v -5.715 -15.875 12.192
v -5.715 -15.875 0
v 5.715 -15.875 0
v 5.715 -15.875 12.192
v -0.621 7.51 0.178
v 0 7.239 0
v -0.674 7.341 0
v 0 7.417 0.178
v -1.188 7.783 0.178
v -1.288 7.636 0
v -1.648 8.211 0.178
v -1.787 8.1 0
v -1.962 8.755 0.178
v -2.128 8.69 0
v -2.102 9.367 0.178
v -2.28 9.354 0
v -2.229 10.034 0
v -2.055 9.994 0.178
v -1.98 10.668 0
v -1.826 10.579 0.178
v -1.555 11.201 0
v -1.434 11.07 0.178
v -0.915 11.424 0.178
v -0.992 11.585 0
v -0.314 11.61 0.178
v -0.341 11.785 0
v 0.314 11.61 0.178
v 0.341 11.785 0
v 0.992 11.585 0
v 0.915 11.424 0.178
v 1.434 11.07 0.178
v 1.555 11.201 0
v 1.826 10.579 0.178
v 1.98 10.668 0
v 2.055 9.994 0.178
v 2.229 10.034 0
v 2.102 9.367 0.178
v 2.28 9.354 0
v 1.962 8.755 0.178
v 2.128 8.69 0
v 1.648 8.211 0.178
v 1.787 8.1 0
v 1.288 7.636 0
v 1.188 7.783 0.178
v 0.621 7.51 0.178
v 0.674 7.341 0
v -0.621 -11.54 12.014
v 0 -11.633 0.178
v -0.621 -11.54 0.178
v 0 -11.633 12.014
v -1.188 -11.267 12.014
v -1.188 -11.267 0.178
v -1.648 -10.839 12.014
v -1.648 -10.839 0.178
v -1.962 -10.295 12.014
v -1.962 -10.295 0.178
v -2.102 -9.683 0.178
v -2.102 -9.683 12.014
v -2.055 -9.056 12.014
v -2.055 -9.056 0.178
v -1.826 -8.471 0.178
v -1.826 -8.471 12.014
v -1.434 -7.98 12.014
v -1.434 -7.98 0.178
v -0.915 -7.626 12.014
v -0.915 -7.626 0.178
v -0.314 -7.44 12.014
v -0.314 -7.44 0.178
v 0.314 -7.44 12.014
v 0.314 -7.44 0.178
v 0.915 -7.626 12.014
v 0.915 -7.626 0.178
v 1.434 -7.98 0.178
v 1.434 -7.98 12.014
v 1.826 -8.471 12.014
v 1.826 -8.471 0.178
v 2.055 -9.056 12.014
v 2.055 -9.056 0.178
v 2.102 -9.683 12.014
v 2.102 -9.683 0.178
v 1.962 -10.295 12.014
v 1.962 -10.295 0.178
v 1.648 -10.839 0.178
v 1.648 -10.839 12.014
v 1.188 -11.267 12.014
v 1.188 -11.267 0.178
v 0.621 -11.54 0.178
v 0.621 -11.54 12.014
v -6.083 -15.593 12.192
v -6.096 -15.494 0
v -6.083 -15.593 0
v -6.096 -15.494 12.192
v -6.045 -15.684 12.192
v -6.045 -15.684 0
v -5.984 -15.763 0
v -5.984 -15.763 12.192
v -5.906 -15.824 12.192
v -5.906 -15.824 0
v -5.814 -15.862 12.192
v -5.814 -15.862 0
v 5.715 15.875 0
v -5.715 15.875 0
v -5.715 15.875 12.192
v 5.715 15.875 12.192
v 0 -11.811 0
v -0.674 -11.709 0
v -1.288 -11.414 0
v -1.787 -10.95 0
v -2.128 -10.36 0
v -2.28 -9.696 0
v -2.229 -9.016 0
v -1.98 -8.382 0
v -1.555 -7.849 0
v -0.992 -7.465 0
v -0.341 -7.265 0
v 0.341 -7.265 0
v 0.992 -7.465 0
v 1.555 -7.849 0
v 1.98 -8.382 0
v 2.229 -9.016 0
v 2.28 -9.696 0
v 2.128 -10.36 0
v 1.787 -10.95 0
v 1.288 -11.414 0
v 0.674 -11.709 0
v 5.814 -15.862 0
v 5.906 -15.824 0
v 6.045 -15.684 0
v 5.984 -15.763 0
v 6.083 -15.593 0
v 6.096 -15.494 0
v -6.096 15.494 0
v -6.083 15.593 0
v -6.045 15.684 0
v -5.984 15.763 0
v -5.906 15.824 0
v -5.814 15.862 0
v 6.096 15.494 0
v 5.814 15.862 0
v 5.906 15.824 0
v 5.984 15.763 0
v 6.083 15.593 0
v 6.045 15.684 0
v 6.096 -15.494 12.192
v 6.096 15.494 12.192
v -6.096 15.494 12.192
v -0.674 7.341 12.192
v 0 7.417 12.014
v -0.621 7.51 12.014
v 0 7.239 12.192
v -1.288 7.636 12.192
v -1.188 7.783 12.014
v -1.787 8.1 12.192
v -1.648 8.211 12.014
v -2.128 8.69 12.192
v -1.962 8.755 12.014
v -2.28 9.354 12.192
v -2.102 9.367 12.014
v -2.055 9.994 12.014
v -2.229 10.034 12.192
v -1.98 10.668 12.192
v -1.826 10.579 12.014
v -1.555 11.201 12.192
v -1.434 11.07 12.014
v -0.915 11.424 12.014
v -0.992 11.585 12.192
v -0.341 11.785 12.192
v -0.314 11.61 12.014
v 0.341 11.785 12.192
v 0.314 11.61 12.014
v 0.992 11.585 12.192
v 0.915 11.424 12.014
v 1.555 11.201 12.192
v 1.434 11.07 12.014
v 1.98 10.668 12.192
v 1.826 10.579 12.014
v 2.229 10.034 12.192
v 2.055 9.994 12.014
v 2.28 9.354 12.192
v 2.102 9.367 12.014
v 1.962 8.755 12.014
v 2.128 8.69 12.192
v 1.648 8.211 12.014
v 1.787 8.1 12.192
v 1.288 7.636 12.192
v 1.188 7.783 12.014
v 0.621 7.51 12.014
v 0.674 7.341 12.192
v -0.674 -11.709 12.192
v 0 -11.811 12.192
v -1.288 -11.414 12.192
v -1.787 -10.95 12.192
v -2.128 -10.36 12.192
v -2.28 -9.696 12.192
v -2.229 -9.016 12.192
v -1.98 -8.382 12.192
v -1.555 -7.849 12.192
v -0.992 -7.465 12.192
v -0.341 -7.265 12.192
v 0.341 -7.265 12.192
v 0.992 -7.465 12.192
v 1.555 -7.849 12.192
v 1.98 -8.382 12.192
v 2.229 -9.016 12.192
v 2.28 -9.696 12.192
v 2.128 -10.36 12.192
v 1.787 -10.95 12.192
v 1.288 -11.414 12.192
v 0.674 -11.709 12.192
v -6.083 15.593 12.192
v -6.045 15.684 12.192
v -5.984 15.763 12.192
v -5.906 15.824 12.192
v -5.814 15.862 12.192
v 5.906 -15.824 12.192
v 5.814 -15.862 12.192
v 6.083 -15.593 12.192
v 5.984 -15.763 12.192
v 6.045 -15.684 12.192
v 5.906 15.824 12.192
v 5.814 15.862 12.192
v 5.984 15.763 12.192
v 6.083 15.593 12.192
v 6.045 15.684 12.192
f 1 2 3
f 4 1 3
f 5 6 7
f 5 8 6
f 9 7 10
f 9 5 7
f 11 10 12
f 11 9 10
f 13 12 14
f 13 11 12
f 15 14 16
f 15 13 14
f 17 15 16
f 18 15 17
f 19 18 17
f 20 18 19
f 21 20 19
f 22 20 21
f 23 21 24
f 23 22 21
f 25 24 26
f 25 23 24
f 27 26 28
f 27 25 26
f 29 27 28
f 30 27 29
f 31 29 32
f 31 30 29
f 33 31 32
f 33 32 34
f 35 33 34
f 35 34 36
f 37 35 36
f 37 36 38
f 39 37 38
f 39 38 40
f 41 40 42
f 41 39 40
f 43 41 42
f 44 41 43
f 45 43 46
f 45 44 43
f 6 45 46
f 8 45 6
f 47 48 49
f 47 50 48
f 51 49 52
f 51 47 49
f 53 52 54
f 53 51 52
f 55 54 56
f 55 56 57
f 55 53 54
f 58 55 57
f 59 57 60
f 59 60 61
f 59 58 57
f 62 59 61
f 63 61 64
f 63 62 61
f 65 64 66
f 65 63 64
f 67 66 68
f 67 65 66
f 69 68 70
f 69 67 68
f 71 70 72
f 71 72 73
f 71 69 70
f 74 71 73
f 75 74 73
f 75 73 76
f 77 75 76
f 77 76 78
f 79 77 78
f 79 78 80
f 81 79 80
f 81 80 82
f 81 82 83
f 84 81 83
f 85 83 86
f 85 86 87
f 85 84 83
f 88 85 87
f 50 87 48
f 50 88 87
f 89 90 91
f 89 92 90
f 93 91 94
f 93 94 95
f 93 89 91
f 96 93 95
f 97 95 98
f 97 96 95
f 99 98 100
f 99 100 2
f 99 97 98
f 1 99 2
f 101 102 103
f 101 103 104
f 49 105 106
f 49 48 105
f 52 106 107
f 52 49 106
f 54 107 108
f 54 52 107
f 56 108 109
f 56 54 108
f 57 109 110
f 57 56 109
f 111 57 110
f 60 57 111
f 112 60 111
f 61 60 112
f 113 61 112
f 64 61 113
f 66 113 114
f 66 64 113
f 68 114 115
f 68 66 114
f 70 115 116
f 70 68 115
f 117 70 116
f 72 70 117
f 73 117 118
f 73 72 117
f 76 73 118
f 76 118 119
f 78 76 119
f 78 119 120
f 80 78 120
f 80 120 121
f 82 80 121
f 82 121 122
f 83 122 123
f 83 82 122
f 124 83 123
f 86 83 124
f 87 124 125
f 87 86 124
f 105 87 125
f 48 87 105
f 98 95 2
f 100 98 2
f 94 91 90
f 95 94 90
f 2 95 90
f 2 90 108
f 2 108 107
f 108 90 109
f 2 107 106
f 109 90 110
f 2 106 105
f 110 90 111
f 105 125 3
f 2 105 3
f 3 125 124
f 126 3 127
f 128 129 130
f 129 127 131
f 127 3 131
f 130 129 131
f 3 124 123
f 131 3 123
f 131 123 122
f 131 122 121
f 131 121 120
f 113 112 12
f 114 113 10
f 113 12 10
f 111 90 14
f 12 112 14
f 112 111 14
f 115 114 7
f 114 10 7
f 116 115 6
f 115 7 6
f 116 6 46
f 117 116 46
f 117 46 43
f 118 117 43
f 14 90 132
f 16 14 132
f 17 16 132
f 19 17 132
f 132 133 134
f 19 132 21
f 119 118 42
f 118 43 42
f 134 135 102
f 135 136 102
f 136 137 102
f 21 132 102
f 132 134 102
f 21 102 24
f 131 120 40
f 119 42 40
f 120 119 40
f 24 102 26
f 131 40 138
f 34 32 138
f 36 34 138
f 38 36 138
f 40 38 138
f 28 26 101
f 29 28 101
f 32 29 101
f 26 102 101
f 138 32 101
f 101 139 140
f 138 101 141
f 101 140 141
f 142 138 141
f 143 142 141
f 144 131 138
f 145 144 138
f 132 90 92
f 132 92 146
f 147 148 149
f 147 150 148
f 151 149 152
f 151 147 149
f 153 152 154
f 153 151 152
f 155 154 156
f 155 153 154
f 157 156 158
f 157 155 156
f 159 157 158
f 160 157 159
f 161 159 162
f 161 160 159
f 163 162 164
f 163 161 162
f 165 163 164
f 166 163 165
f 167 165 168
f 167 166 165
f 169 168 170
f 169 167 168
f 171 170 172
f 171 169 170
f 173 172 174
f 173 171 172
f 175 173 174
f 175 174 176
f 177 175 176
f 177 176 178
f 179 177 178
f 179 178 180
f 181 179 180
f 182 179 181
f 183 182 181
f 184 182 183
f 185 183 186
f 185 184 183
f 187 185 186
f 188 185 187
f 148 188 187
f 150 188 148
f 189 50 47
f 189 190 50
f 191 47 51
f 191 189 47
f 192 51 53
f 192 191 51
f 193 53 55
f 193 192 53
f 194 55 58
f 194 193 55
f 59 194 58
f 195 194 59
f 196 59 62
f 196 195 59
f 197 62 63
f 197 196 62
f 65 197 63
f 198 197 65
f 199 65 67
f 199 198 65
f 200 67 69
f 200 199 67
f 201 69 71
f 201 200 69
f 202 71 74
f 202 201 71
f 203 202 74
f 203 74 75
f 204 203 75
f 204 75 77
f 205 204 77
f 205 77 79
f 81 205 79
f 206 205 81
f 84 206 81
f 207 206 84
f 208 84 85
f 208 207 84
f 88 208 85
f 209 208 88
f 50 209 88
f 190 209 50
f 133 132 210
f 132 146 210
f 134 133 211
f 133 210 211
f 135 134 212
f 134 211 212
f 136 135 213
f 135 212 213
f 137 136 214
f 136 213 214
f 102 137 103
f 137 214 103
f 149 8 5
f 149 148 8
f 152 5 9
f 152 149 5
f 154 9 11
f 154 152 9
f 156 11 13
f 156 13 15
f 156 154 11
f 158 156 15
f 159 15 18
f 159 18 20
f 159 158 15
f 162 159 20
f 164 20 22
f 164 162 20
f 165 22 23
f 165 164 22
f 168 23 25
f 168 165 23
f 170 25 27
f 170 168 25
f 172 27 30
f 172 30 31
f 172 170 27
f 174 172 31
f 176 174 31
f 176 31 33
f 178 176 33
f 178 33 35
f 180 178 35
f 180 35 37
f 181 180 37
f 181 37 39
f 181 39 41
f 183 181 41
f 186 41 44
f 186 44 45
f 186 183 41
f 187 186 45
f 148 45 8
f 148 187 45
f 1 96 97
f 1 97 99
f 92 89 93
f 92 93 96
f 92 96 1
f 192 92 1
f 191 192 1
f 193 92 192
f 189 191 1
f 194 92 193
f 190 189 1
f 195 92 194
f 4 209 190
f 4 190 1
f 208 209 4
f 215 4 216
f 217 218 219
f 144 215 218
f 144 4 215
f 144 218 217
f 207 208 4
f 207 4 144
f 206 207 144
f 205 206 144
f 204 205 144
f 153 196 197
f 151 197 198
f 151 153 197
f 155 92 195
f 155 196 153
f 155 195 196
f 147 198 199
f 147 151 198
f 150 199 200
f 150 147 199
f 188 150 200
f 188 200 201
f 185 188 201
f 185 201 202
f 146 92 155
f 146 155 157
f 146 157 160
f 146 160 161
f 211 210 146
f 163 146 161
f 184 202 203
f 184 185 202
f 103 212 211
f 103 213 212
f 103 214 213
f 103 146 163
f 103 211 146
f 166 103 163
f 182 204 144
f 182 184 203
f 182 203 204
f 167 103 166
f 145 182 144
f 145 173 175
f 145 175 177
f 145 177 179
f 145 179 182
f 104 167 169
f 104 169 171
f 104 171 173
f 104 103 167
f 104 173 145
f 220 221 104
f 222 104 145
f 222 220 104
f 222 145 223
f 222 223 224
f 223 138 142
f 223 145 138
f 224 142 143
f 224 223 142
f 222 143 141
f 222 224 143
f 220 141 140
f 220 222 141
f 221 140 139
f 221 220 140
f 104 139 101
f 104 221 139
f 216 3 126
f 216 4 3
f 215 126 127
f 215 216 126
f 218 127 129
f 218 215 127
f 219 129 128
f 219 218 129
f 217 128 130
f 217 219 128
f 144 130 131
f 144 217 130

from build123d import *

# Parameters (mm, degrees)
SKETCH1_W                            = 12.192
SKETCH1_H                            = 31.75
BOSS_EXTRUDE1_DEPTH                  = 12.192
FILLET1_R                            = 0.381
F_19_0_166_DIAMETER_HOLE1_AT_2_COUNT = 2
F_19_0_166_DIAMETER_HOLE1_AT_2_PITCH = 19.05


with BuildPart() as part:
    # Sketch1 → Boss-Extrude1 (new body)
    with BuildSketch(Plane.XY):
        Rectangle(SKETCH1_W, SKETCH1_H)
    extrude(amount=BOSS_EXTRUDE1_DEPTH)

    # Fillet1
    fillet1_edges = [part.edges().sort_by_distance(p)[0] for p in [
        (-6.096, 15.875, 6.096),
        (6.096, 15.875, 6.096),
        (6.096, -15.875, 6.096),
        (-6.096, -15.875, 6.096),
    ]]
    fillet(fillet1_edges, radius=FILLET1_R)

    # Sketch2 → #19 (0.166) Diameter Hole1 (revolve, cut)
    with BuildSketch(Plane(origin=(0, 9.525, 12.192), x_dir=(0, -1, 0), z_dir=(1, 0, 0))):
        Polygon((0, 0), (0, 12.192), (2.286, 12.192), (2.1082, 12.0142), (2.1082, 0.1778), (2.286, 0), align=None)
    f_19_0_166_diameter_hole1 = revolve(axis=Axis((0, 9.525, 18.542), (0, 0, -1)), mode=Mode.SUBTRACT)

    # #19 (0.166) Diameter Hole1 at 2: #19 (0.166) Diameter Hole1 ×2
    with Locations(*[(0, -i * F_19_0_166_DIAMETER_HOLE1_AT_2_PITCH, 0) for i in range(1, F_19_0_166_DIAMETER_HOLE1_AT_2_COUNT)]):
        add(f_19_0_166_diameter_hole1, mode=Mode.SUBTRACT)


solid = part.part
